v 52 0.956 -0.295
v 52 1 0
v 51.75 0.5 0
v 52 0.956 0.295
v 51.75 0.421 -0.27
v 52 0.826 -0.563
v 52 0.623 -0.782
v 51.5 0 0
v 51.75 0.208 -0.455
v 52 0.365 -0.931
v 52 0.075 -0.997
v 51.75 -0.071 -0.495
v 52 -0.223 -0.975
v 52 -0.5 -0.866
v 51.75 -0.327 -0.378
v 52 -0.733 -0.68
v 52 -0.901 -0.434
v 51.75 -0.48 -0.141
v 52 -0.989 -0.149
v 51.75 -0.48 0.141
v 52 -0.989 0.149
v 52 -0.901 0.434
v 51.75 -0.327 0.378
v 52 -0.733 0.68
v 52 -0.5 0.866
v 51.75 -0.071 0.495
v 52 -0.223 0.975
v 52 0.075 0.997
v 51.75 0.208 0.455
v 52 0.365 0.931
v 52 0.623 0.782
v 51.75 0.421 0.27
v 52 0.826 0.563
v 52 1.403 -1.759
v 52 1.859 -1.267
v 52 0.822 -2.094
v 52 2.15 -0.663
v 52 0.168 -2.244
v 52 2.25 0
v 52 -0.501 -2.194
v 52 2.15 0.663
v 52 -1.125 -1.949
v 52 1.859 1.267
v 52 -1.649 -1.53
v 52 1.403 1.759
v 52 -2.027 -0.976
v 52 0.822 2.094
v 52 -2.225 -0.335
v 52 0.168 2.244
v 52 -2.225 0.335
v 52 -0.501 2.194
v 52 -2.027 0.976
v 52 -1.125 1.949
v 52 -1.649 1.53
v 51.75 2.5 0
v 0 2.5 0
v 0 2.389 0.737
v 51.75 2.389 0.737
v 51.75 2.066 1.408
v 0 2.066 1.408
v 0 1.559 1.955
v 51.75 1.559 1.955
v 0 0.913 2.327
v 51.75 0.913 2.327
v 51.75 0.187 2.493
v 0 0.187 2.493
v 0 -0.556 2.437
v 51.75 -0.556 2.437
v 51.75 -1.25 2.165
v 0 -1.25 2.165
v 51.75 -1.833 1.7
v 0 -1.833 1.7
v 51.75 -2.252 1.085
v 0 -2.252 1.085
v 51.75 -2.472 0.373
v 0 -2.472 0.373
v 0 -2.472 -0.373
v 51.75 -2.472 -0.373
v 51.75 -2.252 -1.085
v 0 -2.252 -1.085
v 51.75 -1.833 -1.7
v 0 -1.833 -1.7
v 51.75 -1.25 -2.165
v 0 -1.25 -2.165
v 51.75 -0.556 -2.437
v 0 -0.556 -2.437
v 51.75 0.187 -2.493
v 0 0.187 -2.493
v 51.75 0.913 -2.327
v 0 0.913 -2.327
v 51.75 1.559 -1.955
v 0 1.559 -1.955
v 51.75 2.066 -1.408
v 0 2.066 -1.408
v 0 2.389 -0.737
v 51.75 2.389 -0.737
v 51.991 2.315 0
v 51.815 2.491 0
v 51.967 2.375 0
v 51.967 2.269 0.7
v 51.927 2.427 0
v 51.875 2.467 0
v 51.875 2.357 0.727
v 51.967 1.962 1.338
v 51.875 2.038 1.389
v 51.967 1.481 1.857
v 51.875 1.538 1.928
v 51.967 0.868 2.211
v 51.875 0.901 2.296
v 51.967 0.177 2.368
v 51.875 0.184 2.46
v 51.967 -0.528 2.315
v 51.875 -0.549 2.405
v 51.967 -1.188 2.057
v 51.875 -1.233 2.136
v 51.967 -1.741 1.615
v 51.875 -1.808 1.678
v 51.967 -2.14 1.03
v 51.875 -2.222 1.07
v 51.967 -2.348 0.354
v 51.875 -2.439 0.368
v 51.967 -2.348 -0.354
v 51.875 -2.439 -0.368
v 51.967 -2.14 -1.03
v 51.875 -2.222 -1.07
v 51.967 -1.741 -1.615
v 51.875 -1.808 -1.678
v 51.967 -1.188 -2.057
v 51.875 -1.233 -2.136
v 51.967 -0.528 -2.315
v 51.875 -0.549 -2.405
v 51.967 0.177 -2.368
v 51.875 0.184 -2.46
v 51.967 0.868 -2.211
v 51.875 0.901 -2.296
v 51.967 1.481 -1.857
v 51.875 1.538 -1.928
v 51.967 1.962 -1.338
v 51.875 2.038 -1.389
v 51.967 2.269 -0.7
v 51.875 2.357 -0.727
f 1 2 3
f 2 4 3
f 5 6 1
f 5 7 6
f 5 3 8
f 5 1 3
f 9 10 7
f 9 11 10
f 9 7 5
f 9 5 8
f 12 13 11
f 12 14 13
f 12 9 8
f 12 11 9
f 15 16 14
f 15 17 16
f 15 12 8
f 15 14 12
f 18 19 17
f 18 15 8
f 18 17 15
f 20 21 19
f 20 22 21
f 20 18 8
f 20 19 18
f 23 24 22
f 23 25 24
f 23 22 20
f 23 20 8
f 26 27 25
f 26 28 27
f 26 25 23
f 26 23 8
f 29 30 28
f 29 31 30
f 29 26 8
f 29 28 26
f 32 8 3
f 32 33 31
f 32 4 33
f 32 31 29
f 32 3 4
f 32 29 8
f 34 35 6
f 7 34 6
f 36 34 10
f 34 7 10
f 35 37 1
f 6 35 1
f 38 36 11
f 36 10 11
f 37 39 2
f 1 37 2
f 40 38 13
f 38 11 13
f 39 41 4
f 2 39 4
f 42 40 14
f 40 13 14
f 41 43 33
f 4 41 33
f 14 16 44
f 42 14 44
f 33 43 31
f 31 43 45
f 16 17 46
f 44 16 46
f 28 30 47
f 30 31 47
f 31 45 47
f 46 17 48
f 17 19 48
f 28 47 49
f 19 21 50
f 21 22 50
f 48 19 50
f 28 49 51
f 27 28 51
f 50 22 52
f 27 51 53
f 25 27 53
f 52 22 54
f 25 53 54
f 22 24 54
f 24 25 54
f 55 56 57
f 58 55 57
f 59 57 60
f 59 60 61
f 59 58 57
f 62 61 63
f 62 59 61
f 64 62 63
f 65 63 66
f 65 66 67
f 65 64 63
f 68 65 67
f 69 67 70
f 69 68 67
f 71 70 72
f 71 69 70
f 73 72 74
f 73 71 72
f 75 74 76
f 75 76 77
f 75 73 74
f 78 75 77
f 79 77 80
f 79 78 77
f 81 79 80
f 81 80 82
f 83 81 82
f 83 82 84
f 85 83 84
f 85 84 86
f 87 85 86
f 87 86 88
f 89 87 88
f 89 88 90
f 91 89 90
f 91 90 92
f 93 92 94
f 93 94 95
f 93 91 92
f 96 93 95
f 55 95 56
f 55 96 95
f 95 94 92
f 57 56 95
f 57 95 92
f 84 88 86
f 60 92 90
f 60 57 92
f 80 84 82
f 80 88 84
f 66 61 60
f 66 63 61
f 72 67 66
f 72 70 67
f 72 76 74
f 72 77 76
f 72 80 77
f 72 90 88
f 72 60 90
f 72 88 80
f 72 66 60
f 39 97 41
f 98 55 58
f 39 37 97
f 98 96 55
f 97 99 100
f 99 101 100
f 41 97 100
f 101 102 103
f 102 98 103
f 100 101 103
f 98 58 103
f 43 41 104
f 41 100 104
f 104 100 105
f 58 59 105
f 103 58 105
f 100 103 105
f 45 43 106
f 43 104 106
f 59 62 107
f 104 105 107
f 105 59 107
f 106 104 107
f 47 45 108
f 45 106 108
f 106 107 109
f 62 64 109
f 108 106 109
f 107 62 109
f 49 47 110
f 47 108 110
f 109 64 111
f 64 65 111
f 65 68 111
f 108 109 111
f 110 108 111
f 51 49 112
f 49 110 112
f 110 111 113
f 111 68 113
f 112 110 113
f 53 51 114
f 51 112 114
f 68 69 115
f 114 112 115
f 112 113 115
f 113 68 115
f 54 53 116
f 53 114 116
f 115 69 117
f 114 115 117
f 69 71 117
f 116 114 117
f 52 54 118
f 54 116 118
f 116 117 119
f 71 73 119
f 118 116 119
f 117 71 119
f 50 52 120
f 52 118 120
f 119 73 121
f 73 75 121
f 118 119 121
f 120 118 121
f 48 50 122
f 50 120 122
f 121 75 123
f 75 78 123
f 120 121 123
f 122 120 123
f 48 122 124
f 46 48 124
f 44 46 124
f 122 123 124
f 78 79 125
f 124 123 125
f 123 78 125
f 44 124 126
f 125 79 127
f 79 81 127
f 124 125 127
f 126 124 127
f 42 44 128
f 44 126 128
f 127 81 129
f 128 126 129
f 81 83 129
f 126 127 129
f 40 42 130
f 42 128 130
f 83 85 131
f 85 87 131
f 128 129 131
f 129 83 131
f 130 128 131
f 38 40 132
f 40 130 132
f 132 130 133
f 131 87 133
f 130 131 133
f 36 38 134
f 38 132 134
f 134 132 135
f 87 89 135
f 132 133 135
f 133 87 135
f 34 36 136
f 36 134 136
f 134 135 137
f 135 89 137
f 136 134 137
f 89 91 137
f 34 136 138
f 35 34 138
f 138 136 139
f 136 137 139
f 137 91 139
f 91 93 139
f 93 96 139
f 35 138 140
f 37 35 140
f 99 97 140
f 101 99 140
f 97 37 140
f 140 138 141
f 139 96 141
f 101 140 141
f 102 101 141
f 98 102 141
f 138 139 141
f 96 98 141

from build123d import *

# Parameters (mm, degrees)
CROQUIS1_W  = 52
CROQUIS1_H  = 2.5
REDONDEO1_R = 0.25


with BuildPart() as part:
    # Croquis1 → Revolución1 (revolve)
    with BuildSketch(Plane.XY):
        with Locations((26, 1.25)):
            Rectangle(CROQUIS1_W, CROQUIS1_H)
    revolve(axis=Axis((0, 0, 0), (1, 0, 0)))

    # Redondeo1
    redondeo1_edges = [part.edges().sort_by_distance(p)[0] for p in [
        (52, -2.5, 0),
    ]]
    fillet(redondeo1_edges, radius=REDONDEO1_R)

    # Croquis3 → Cortar-Revolución1 (revolve, cut)
    with BuildSketch(Plane.XY):
        Polygon((52, 0), (51.5, 0), (52, 1), align=None)
    revolve(axis=Axis((52, 0, 0), (-1, 0, 0)), mode=Mode.SUBTRACT)


solid = part.part
